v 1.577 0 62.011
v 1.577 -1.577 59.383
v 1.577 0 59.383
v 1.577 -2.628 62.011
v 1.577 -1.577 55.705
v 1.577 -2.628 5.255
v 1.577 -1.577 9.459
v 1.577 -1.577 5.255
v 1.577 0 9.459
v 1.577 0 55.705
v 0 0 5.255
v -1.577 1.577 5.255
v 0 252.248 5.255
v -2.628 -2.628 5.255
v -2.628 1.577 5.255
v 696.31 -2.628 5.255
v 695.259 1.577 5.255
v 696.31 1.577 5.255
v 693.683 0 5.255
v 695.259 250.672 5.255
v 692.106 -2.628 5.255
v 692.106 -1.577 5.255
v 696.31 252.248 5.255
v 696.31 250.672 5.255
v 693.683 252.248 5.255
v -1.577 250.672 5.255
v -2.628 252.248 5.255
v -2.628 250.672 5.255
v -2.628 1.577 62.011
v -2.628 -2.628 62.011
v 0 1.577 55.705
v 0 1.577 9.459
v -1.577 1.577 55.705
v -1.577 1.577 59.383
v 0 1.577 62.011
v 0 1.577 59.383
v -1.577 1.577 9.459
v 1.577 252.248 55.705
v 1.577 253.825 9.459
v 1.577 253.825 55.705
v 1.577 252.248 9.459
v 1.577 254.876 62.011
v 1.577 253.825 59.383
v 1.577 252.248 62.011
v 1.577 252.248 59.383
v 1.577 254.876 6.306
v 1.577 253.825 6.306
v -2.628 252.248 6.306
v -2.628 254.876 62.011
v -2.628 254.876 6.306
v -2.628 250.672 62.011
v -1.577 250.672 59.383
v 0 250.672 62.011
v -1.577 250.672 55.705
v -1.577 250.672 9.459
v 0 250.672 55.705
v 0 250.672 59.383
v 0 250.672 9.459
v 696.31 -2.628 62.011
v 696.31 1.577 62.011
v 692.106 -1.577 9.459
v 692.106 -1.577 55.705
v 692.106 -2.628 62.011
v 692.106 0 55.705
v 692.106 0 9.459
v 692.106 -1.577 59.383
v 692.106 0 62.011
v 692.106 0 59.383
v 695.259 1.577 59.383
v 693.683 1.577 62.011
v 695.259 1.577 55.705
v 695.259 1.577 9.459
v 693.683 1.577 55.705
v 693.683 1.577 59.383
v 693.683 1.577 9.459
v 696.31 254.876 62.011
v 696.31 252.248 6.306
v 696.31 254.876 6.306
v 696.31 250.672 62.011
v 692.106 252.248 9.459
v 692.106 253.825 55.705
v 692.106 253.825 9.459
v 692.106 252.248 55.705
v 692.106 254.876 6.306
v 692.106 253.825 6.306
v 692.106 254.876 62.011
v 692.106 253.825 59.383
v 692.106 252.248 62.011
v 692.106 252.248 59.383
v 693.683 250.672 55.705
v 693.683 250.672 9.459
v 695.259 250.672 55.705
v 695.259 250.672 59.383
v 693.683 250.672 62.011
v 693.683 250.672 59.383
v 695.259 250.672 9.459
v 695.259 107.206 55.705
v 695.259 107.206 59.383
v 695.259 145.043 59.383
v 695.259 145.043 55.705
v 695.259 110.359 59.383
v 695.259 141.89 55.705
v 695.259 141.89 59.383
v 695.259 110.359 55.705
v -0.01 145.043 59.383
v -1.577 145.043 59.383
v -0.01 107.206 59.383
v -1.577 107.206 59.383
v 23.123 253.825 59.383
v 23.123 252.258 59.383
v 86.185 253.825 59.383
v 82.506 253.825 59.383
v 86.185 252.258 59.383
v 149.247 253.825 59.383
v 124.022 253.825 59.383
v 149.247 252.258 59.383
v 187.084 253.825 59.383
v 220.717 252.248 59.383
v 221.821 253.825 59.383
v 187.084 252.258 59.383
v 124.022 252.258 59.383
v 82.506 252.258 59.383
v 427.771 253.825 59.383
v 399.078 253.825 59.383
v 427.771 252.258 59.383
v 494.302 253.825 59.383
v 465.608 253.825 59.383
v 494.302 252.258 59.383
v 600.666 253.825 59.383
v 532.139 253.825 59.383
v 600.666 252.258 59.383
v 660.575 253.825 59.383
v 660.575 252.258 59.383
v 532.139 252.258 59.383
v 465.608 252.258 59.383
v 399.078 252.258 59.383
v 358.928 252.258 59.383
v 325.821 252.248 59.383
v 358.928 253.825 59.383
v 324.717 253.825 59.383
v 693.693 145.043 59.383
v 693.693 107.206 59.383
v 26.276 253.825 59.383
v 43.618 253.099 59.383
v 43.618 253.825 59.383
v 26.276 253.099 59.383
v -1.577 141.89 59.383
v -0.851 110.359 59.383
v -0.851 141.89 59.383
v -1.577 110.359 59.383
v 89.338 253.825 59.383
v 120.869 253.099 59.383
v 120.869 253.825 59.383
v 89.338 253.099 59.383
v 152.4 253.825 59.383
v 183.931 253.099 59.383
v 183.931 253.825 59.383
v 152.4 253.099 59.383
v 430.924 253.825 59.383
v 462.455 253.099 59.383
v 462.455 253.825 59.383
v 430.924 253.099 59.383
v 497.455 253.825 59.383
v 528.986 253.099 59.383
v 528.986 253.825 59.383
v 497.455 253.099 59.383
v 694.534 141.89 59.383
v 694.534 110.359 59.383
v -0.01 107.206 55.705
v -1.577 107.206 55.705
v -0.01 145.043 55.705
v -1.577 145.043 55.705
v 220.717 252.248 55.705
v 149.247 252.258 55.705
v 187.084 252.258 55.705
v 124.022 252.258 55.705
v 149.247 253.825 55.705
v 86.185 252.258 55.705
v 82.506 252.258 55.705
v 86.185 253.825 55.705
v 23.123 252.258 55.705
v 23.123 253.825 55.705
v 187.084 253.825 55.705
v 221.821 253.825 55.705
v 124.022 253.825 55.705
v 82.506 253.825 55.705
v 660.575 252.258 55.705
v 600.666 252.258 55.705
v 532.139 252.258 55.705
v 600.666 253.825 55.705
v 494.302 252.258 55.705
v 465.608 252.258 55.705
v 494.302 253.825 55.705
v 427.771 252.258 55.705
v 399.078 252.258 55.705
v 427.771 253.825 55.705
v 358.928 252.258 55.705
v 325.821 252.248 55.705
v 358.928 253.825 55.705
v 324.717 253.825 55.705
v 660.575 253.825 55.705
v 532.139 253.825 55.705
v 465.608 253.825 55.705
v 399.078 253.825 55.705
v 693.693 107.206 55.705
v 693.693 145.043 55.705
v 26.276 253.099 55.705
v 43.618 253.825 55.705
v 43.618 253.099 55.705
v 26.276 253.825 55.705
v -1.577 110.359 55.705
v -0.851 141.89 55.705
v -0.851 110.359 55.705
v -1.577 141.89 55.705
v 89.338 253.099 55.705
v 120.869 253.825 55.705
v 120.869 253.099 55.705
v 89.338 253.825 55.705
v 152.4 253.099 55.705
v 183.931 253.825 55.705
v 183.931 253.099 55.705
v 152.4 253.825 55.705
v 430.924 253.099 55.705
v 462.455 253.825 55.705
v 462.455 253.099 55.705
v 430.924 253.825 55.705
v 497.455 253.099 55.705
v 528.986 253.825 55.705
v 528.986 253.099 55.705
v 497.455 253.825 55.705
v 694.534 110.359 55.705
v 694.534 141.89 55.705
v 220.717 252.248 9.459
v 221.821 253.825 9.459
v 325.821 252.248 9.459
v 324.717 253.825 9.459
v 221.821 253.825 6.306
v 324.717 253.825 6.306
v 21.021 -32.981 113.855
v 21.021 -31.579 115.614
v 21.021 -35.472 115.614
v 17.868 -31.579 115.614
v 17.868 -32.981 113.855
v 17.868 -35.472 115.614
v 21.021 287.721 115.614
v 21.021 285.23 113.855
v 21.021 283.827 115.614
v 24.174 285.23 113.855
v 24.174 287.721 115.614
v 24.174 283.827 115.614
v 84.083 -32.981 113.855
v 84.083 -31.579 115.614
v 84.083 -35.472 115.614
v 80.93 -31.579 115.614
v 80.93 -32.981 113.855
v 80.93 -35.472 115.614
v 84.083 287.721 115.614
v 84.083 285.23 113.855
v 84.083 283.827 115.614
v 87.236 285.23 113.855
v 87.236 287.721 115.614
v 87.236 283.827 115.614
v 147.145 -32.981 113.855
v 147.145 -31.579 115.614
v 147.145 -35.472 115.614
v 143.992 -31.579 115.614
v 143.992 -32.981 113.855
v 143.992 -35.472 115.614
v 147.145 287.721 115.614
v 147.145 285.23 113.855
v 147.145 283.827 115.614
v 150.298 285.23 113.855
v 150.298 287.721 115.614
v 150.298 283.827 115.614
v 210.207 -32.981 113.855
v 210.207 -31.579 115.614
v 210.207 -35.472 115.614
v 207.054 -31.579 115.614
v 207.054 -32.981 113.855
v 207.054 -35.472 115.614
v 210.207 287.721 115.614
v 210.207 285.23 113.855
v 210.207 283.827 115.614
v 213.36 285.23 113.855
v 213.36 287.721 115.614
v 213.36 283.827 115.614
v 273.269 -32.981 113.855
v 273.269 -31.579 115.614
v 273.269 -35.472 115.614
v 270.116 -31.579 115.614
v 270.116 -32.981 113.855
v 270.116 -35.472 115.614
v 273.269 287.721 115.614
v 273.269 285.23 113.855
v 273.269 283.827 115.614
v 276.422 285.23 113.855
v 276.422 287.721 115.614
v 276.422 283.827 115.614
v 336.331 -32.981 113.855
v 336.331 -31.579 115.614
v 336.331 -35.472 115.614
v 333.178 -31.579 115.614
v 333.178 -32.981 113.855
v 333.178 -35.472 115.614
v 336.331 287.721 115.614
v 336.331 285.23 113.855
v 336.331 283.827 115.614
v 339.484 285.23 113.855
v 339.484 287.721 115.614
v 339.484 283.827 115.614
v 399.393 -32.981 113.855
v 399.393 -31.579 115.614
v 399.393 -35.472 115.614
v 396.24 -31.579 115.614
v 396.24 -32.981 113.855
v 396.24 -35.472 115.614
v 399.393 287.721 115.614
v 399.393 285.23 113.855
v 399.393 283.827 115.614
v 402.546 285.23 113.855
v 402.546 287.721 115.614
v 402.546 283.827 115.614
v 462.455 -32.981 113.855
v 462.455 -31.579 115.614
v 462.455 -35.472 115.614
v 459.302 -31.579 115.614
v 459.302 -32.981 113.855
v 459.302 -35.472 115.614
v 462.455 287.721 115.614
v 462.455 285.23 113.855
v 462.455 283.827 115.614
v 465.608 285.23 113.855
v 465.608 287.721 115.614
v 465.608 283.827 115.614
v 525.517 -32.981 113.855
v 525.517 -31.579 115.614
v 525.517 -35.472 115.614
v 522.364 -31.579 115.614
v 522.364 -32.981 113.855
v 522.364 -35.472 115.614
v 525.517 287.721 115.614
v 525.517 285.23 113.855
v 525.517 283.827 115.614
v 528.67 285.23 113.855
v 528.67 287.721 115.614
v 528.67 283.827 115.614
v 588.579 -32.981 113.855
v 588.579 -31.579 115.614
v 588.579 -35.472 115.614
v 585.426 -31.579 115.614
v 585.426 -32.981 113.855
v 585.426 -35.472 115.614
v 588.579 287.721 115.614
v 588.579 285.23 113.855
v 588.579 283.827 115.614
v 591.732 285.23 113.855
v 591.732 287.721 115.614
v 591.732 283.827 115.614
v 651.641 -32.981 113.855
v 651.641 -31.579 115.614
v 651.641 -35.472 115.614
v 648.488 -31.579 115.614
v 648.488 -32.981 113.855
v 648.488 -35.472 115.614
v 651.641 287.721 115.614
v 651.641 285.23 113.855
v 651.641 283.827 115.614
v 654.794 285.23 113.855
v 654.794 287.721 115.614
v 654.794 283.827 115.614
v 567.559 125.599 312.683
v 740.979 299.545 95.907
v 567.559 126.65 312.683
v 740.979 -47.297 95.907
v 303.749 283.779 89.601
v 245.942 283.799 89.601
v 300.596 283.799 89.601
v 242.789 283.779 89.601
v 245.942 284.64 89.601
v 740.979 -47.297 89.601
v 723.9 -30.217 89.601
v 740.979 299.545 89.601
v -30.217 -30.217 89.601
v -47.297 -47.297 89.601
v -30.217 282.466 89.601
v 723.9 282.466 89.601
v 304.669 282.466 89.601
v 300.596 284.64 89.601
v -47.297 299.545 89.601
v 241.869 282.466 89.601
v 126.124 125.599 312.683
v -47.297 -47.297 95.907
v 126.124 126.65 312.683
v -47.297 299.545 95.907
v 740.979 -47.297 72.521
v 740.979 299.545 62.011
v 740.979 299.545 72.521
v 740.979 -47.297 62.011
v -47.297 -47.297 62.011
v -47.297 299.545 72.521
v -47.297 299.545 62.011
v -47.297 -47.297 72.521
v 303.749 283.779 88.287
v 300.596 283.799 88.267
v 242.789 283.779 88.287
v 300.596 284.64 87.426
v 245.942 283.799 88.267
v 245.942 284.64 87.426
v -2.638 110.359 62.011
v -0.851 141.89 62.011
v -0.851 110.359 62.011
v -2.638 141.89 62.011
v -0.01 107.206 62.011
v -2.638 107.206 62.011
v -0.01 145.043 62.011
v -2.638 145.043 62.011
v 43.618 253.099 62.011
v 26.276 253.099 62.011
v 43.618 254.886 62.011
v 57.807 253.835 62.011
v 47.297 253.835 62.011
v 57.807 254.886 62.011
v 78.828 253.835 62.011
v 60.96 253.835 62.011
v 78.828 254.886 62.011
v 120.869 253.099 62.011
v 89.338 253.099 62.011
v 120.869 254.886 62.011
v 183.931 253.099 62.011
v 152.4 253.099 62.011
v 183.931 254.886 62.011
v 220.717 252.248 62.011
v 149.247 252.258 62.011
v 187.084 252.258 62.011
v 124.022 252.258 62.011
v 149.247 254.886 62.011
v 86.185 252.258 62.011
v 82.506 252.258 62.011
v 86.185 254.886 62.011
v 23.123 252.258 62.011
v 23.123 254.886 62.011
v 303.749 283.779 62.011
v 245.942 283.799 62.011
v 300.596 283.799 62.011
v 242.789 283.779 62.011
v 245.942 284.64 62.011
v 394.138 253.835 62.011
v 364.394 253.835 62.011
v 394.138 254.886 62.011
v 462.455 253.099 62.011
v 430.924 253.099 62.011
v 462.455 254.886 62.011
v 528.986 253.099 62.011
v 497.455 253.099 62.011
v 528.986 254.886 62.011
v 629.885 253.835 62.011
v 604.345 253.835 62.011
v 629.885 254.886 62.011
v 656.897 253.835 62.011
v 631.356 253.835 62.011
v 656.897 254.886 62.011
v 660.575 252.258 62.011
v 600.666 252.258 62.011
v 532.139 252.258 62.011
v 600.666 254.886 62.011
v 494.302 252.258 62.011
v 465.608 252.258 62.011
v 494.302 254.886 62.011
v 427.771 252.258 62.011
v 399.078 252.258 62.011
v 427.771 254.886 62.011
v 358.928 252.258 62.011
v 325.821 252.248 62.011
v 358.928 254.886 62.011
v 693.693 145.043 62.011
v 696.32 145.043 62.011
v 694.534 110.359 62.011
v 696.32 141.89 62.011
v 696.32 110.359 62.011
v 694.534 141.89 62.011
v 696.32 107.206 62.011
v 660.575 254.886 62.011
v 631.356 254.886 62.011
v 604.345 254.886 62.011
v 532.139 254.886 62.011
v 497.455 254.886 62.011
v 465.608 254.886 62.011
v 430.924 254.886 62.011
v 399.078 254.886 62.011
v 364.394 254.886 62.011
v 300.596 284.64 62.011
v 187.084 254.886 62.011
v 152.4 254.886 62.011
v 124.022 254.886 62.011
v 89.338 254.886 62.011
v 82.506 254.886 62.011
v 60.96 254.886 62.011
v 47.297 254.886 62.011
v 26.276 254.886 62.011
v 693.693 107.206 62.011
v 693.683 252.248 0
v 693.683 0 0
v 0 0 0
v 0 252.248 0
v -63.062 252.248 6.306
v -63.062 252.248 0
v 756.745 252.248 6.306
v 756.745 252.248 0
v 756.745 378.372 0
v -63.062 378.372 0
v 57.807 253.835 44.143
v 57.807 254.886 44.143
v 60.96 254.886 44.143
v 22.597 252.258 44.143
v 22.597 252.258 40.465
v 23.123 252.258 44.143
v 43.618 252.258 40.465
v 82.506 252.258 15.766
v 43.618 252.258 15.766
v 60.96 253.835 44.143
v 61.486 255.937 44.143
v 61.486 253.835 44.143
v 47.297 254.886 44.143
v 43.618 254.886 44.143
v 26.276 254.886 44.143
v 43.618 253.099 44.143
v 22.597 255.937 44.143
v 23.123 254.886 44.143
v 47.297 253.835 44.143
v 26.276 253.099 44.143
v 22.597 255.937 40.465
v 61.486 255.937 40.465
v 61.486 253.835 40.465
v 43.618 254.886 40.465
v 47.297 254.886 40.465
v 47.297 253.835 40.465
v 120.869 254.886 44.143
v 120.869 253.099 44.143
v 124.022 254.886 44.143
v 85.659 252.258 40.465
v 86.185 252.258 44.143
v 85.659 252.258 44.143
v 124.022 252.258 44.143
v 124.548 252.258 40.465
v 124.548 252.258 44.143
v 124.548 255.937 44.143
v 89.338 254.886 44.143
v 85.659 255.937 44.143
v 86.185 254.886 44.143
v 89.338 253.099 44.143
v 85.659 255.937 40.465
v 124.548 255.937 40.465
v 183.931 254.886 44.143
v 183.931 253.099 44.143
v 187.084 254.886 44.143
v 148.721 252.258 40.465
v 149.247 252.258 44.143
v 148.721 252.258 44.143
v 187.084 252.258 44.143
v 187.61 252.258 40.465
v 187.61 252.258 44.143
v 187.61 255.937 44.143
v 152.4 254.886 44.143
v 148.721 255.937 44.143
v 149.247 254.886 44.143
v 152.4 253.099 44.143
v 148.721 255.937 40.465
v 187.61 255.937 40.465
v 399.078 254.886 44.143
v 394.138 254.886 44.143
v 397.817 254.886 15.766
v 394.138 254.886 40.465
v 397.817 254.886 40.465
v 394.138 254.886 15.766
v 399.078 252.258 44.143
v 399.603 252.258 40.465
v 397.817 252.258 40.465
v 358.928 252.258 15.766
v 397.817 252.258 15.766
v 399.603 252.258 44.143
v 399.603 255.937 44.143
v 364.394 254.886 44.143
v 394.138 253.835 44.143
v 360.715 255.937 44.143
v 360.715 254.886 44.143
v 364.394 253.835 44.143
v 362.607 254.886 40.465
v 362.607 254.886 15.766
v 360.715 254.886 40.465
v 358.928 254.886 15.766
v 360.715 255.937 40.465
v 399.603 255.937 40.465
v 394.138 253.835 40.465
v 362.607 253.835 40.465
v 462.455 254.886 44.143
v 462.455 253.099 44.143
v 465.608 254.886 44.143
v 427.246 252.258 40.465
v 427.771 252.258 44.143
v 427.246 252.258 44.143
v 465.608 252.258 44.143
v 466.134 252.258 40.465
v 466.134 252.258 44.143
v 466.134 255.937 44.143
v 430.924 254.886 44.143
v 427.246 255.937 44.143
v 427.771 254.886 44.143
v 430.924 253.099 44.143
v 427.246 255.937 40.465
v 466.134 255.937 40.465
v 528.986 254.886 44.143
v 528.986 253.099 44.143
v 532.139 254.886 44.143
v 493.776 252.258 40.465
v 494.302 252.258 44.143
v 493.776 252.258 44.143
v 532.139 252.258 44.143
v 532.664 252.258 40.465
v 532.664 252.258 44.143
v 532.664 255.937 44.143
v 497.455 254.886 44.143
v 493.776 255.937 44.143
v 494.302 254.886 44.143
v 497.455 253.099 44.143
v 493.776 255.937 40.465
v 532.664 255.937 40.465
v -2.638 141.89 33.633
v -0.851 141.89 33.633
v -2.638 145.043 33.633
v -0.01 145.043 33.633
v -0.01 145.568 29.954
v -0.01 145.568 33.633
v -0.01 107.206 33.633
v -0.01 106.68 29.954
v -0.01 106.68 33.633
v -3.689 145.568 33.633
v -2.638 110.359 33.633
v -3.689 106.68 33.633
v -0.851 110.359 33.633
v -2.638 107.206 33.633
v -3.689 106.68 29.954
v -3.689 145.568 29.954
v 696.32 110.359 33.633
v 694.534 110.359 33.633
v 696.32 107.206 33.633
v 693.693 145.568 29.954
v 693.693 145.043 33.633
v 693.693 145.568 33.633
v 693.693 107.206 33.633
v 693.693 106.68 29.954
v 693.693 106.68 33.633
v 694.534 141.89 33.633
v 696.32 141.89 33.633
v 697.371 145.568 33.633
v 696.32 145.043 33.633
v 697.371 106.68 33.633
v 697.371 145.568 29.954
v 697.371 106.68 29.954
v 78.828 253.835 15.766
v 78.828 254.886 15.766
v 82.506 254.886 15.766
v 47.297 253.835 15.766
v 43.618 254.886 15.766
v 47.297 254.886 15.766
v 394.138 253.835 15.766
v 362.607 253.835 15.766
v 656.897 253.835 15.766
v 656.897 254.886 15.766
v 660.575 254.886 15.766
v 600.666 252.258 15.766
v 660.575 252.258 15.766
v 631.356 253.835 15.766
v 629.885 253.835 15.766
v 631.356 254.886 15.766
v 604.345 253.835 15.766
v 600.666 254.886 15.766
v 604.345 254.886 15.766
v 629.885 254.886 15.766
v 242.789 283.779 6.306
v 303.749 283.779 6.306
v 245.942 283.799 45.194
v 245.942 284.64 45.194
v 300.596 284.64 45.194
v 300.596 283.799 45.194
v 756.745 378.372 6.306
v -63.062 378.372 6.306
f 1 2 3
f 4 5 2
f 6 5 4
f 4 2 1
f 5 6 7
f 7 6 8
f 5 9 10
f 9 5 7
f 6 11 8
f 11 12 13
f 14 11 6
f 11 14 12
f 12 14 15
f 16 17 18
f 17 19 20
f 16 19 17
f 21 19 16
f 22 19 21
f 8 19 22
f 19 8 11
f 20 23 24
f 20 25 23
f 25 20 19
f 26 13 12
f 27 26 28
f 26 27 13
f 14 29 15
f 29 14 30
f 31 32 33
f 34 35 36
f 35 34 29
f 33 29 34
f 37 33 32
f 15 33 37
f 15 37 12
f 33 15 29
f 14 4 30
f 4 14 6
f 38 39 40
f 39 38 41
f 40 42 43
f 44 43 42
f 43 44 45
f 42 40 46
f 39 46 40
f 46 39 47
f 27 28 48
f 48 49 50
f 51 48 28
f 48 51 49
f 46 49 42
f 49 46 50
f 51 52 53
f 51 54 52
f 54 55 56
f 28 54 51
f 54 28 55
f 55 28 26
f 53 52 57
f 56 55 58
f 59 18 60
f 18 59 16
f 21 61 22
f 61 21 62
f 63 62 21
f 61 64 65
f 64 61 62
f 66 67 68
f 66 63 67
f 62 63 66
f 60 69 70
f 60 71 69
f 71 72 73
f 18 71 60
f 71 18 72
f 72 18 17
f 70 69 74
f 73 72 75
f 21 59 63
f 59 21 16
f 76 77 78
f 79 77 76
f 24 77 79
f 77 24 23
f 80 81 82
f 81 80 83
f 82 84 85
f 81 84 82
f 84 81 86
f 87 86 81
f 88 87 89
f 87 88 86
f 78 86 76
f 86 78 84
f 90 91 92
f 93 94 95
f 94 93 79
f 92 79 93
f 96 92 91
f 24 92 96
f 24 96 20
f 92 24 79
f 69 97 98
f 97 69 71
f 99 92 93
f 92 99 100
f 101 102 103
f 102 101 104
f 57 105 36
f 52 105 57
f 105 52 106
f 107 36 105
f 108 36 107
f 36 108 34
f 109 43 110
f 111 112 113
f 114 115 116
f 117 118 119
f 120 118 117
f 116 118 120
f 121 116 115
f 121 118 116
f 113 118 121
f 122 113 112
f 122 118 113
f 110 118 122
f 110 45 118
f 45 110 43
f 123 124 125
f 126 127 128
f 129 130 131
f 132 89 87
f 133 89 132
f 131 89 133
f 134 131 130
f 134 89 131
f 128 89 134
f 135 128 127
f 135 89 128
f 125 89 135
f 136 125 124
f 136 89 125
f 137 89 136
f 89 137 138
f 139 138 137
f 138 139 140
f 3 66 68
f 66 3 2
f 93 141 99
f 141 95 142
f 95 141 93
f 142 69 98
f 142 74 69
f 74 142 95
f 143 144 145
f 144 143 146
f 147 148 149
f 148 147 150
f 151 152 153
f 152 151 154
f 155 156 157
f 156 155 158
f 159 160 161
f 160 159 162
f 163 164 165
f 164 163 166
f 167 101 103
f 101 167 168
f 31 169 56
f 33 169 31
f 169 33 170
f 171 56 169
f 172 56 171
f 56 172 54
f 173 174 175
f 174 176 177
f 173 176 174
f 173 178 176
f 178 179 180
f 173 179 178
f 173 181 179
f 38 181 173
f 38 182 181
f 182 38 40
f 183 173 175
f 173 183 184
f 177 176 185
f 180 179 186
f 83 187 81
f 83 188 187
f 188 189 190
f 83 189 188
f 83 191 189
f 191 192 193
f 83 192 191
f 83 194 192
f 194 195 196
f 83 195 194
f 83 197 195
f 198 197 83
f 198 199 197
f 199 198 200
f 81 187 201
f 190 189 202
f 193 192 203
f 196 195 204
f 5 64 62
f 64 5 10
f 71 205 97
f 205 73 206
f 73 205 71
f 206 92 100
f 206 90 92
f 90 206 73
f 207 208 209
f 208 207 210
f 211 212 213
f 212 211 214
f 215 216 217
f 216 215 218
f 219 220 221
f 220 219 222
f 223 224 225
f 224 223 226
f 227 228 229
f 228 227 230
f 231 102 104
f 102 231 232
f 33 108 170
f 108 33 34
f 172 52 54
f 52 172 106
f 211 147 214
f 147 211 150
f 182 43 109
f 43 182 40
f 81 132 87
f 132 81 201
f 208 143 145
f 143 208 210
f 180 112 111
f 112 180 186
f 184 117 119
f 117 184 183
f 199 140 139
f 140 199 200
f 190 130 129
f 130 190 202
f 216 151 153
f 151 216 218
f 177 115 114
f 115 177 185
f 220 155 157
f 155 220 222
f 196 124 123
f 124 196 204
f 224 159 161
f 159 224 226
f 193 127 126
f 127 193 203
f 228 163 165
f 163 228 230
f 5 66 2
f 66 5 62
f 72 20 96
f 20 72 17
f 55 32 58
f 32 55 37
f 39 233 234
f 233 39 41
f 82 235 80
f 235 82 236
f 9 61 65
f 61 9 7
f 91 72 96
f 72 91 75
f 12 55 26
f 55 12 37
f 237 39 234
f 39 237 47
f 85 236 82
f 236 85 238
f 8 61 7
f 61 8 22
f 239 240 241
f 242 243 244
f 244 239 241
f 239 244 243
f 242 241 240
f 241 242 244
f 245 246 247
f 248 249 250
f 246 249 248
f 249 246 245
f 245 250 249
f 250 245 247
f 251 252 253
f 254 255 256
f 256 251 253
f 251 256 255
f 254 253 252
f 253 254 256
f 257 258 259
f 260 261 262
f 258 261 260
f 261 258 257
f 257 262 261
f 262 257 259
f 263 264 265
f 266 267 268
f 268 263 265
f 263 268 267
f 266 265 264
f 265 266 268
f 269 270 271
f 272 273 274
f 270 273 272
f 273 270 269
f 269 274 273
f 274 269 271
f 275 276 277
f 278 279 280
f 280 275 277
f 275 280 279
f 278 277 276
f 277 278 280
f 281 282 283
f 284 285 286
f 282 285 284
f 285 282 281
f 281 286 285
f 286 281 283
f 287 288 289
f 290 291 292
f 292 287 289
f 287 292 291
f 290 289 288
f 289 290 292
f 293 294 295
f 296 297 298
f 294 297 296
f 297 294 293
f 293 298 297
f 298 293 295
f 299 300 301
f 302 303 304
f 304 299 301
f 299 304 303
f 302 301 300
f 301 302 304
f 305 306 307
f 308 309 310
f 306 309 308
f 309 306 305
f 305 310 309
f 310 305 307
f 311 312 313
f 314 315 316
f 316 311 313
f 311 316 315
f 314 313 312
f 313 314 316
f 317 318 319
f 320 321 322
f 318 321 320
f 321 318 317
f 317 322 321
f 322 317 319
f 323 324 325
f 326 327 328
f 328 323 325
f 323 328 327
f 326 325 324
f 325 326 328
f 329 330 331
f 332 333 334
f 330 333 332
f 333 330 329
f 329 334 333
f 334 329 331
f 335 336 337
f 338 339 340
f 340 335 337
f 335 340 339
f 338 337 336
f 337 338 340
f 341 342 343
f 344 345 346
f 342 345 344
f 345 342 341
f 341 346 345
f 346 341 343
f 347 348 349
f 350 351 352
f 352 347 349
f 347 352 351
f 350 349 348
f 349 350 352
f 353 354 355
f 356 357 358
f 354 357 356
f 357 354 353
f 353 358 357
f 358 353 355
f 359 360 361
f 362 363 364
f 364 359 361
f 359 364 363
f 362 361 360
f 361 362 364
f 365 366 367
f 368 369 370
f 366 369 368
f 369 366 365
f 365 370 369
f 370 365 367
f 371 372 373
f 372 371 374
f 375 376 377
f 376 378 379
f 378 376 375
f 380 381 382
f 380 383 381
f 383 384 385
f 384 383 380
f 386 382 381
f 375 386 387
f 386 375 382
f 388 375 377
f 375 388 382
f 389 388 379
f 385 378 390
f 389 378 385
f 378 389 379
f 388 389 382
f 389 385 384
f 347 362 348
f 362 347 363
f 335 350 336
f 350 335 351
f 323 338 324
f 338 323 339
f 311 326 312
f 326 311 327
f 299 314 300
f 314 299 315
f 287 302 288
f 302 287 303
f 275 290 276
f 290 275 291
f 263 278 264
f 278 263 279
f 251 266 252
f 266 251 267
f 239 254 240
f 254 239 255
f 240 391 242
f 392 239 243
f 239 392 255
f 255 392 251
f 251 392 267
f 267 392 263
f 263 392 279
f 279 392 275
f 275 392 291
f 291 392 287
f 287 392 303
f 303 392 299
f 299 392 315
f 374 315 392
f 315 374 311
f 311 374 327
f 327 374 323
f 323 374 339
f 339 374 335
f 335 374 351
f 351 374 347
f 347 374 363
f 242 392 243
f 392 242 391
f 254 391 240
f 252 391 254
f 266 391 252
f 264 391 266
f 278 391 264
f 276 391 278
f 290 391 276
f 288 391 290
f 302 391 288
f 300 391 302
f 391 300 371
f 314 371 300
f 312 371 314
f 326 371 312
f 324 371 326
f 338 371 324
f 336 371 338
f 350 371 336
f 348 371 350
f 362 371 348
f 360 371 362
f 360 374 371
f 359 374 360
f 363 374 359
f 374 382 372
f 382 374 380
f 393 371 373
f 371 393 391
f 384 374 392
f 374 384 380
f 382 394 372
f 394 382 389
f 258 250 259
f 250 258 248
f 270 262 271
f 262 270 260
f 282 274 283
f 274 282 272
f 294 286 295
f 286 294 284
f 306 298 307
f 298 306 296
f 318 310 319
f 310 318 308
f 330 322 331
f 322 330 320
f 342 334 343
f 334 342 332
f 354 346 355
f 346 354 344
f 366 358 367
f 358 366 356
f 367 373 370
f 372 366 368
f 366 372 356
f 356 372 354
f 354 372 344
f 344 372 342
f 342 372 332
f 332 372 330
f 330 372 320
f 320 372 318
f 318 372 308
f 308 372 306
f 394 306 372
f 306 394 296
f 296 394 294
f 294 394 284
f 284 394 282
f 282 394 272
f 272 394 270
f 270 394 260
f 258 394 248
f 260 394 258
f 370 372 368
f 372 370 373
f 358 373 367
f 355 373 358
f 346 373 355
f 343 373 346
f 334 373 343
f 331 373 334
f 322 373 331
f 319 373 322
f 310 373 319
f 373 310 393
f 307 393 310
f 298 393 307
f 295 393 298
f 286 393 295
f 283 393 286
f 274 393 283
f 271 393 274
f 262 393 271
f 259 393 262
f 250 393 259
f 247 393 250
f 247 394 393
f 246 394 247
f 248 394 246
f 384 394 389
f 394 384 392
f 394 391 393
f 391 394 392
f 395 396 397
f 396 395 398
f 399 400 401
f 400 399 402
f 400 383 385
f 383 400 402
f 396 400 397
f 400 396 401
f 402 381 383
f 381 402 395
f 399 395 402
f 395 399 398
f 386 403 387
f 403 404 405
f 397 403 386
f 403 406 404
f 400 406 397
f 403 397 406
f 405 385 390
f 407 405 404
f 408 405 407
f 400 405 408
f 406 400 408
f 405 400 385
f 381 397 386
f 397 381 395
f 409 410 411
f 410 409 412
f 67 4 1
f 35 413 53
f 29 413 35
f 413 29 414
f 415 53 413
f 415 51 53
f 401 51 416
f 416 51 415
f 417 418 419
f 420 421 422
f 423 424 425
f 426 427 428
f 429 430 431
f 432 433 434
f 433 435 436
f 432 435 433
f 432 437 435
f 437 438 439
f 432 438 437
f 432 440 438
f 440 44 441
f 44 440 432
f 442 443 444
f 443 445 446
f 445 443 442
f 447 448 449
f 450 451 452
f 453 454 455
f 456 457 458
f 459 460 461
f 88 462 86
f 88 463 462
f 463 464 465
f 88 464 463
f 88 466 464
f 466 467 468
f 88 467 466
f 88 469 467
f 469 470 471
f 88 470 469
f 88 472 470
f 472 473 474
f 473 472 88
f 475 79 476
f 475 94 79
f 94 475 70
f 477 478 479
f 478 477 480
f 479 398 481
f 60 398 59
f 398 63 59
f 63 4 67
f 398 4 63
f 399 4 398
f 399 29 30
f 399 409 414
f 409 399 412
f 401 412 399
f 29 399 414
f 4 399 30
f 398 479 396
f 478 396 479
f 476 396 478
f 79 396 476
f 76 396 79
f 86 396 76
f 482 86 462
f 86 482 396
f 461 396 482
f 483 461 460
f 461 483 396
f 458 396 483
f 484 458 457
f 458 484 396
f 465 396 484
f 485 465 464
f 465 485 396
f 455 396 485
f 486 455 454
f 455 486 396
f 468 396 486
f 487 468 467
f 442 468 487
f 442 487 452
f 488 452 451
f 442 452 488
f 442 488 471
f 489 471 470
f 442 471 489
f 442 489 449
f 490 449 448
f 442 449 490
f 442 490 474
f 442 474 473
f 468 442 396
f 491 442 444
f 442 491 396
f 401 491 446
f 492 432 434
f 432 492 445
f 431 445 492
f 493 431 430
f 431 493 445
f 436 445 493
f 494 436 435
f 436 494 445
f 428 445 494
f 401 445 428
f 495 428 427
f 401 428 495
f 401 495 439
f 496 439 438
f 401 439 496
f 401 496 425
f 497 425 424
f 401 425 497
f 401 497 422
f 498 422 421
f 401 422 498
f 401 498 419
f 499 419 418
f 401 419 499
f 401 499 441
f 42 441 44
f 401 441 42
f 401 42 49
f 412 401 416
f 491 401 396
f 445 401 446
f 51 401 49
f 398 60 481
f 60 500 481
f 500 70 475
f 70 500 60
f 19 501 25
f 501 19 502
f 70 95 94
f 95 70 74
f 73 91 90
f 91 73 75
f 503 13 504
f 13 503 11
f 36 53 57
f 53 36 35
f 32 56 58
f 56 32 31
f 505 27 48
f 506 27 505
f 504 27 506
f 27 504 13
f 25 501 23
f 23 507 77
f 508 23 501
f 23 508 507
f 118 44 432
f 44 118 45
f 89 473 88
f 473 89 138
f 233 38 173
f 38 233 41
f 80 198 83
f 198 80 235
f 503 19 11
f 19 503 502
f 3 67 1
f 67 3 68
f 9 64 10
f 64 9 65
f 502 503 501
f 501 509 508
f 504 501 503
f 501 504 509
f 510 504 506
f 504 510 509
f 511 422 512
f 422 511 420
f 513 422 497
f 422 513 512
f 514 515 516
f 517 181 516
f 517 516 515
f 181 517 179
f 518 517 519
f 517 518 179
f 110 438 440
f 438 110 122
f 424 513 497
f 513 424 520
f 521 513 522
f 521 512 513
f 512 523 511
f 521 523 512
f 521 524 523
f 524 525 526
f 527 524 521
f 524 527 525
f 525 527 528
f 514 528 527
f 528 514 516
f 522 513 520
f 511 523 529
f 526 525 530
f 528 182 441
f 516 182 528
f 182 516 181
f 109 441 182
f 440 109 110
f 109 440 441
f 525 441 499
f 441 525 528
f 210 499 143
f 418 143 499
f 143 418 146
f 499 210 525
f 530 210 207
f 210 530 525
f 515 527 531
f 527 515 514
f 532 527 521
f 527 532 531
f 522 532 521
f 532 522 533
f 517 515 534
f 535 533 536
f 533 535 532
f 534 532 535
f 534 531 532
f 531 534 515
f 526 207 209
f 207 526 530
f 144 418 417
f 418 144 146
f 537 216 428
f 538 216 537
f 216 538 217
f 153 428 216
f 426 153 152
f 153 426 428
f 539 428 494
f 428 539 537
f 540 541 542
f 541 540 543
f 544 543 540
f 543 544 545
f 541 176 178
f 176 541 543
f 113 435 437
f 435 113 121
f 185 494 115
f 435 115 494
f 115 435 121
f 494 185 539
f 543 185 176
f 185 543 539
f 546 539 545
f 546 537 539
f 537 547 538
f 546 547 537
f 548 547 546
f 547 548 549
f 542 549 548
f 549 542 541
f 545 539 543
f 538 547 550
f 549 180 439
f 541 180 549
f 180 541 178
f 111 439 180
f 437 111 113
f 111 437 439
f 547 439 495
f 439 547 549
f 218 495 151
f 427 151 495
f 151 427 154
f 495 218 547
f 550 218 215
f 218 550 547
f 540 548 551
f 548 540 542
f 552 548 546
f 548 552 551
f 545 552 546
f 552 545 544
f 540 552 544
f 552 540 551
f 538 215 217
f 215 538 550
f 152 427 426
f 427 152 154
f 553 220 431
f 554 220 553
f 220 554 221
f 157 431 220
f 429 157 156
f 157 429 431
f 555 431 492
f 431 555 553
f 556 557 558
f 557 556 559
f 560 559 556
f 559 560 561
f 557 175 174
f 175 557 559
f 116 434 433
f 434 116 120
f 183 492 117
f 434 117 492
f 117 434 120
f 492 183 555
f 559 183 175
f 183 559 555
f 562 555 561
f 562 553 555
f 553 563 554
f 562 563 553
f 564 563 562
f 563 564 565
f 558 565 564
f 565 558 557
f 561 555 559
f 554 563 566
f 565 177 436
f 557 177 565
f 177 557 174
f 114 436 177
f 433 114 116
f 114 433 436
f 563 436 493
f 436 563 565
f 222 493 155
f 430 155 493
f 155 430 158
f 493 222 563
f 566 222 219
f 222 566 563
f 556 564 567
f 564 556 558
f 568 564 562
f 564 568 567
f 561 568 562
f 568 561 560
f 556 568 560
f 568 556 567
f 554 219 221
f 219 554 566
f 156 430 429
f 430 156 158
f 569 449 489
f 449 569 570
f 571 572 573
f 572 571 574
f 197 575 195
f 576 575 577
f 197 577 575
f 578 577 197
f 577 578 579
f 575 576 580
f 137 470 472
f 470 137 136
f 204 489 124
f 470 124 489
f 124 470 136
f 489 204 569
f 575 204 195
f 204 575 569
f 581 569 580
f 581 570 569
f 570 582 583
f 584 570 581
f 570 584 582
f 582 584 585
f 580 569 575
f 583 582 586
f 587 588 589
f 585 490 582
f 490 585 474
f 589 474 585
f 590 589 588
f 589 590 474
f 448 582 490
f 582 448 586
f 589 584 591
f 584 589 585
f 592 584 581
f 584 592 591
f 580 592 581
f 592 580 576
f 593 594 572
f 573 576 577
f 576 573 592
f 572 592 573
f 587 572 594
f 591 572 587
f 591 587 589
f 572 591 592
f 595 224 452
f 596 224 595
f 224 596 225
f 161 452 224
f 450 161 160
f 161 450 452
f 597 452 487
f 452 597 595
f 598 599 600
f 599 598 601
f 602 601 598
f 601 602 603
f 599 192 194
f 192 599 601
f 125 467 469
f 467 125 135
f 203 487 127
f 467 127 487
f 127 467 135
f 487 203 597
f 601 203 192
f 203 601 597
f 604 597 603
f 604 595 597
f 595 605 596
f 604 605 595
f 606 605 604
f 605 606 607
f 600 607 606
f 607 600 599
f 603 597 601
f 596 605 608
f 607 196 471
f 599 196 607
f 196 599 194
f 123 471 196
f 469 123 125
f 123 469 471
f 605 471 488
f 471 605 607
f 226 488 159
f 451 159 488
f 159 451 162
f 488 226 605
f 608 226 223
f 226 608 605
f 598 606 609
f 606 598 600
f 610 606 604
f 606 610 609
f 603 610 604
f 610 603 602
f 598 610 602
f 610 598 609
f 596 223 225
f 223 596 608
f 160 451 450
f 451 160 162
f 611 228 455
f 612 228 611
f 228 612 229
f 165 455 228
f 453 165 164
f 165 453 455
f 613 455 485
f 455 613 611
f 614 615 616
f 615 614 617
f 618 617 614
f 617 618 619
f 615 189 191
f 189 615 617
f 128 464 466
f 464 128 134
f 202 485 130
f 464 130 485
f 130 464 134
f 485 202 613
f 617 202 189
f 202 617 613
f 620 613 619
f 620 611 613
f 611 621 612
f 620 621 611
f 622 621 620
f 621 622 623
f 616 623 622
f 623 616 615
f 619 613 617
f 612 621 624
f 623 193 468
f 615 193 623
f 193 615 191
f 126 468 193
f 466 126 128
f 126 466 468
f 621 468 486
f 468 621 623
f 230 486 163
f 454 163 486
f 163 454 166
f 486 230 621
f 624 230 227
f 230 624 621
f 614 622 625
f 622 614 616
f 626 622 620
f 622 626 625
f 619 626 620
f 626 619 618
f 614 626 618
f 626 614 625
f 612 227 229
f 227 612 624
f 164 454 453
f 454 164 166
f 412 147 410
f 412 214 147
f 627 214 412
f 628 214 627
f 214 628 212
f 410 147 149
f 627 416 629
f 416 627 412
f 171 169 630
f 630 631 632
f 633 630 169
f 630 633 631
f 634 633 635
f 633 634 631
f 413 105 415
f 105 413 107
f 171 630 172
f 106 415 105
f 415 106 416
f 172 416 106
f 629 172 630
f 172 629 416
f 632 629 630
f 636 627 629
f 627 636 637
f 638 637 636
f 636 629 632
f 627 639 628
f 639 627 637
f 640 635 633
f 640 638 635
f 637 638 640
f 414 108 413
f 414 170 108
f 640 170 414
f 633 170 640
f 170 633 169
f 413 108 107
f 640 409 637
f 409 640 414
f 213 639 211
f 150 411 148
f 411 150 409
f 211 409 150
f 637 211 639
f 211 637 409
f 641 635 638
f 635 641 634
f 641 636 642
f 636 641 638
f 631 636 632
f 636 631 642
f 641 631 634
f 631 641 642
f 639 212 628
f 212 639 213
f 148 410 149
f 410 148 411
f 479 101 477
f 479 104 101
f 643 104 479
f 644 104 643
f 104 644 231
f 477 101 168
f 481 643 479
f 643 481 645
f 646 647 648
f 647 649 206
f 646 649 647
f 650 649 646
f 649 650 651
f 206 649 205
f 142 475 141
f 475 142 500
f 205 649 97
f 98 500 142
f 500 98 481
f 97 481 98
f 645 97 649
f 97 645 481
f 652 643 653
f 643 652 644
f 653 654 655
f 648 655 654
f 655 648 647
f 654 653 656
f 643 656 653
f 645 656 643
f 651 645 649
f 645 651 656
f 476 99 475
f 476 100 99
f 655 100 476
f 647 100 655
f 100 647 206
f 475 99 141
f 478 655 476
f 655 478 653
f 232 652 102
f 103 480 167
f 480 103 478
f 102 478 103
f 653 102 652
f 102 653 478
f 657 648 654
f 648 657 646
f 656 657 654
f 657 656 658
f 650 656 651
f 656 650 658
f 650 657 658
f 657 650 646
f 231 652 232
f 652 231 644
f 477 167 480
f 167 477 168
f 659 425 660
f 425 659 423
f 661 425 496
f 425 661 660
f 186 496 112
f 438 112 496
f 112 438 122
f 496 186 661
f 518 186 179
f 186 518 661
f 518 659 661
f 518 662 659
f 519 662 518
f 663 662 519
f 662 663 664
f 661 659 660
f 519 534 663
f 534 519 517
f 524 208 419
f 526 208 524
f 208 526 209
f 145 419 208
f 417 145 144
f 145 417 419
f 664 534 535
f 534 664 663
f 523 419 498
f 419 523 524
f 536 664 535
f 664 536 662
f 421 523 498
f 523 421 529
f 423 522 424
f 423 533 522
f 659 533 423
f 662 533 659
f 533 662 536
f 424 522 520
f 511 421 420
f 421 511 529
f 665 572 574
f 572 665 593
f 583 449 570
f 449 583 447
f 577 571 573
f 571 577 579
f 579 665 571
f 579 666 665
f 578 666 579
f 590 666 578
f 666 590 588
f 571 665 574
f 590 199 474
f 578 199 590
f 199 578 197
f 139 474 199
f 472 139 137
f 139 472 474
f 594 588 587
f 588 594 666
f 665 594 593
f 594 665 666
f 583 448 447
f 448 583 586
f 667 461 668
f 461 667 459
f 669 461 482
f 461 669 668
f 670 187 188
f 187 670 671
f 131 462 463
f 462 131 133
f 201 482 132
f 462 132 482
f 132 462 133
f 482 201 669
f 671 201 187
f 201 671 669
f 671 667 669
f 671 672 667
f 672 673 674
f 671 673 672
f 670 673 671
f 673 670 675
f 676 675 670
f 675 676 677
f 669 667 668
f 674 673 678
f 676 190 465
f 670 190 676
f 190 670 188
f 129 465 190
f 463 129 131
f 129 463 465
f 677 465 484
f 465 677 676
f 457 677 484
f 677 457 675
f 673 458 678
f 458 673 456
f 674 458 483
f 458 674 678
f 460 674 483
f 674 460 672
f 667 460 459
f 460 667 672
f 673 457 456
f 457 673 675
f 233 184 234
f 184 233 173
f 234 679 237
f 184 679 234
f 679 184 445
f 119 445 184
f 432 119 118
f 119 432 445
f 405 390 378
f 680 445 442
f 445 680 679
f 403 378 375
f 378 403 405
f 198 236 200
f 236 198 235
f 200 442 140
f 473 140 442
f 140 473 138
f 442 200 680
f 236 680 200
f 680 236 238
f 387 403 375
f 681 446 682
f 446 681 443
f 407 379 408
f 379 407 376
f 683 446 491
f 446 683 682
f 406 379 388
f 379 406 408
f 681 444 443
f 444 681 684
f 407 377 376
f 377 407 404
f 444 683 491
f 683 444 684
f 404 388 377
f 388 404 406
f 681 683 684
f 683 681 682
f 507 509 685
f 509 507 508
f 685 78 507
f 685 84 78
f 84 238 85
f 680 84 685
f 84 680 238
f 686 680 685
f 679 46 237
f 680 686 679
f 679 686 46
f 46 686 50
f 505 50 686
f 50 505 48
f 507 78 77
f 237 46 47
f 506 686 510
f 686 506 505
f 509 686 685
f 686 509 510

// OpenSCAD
// =====================================================================
//  MILWAUKEE ROAD - STANDARD 24 X 66 FT PASSENGER DEPOT, LYONS, IOWA (C.M.&ST.P., NOV 1898)
//  Album of Depot Plans (1919), sheet 18. Private reference (in copyright):
//  Research Library / RSW / Stations / Standard depots / Album of Depot Plans 1919.
//  Rib Side Works, 24 Nov 2026. FIRST SHAPE MODEL for review - not cut into print sections.
//  KNOWN (from the sheet): 24 x 66 ft; men's waiting room 20, office 12 with bay, women's waiting room 19, baggage room 12 ft 6; steep flared hipped shingle roof with iron cresting, lap siding with vertical boards below.
//  ESTIMATE: wall and ridge heights (sheets are small copies), window spacing, colours.
//  Shared depot builder ../../../_common/rsw_depot.scad (x along the track, y = 0 town side,
//  track side +y, feet).  SCALE: 29 = G, 48 = O, 87 = HO.
// =====================================================================
SCALE = 29;
include <../../../_common/rsw_depot.scad>

depot(blocks = [[0, 66, 0, 24, 11, 1.0, 3, 4.5, 0]],
      pavs   = [],
      wins   = [[4.0, 1, 3, 6, 4.2], [10.0, 1, 3, 6, 4.2], [16.0, 1, 3, 6, 4.2], [36.17, 1, 3, 6, 4.2], [42.5, 1, 3, 6, 4.2], [48.83, 1, 3, 6, 4.2], [12, 2, 3, 6, 3.2], [12, 3, 3, 6, 3.2]],
      doors  = [[6, 1, 3, 7.5, 0], [36, 1, 3, 7.5, 0], [60, 1, 5, 8, 1]],
      bays   = [[26, 1, 10, 3]],
      chims  = [[30, 12, 26.0]],
      plat   = [-6, 78, 12, 0.6]);
